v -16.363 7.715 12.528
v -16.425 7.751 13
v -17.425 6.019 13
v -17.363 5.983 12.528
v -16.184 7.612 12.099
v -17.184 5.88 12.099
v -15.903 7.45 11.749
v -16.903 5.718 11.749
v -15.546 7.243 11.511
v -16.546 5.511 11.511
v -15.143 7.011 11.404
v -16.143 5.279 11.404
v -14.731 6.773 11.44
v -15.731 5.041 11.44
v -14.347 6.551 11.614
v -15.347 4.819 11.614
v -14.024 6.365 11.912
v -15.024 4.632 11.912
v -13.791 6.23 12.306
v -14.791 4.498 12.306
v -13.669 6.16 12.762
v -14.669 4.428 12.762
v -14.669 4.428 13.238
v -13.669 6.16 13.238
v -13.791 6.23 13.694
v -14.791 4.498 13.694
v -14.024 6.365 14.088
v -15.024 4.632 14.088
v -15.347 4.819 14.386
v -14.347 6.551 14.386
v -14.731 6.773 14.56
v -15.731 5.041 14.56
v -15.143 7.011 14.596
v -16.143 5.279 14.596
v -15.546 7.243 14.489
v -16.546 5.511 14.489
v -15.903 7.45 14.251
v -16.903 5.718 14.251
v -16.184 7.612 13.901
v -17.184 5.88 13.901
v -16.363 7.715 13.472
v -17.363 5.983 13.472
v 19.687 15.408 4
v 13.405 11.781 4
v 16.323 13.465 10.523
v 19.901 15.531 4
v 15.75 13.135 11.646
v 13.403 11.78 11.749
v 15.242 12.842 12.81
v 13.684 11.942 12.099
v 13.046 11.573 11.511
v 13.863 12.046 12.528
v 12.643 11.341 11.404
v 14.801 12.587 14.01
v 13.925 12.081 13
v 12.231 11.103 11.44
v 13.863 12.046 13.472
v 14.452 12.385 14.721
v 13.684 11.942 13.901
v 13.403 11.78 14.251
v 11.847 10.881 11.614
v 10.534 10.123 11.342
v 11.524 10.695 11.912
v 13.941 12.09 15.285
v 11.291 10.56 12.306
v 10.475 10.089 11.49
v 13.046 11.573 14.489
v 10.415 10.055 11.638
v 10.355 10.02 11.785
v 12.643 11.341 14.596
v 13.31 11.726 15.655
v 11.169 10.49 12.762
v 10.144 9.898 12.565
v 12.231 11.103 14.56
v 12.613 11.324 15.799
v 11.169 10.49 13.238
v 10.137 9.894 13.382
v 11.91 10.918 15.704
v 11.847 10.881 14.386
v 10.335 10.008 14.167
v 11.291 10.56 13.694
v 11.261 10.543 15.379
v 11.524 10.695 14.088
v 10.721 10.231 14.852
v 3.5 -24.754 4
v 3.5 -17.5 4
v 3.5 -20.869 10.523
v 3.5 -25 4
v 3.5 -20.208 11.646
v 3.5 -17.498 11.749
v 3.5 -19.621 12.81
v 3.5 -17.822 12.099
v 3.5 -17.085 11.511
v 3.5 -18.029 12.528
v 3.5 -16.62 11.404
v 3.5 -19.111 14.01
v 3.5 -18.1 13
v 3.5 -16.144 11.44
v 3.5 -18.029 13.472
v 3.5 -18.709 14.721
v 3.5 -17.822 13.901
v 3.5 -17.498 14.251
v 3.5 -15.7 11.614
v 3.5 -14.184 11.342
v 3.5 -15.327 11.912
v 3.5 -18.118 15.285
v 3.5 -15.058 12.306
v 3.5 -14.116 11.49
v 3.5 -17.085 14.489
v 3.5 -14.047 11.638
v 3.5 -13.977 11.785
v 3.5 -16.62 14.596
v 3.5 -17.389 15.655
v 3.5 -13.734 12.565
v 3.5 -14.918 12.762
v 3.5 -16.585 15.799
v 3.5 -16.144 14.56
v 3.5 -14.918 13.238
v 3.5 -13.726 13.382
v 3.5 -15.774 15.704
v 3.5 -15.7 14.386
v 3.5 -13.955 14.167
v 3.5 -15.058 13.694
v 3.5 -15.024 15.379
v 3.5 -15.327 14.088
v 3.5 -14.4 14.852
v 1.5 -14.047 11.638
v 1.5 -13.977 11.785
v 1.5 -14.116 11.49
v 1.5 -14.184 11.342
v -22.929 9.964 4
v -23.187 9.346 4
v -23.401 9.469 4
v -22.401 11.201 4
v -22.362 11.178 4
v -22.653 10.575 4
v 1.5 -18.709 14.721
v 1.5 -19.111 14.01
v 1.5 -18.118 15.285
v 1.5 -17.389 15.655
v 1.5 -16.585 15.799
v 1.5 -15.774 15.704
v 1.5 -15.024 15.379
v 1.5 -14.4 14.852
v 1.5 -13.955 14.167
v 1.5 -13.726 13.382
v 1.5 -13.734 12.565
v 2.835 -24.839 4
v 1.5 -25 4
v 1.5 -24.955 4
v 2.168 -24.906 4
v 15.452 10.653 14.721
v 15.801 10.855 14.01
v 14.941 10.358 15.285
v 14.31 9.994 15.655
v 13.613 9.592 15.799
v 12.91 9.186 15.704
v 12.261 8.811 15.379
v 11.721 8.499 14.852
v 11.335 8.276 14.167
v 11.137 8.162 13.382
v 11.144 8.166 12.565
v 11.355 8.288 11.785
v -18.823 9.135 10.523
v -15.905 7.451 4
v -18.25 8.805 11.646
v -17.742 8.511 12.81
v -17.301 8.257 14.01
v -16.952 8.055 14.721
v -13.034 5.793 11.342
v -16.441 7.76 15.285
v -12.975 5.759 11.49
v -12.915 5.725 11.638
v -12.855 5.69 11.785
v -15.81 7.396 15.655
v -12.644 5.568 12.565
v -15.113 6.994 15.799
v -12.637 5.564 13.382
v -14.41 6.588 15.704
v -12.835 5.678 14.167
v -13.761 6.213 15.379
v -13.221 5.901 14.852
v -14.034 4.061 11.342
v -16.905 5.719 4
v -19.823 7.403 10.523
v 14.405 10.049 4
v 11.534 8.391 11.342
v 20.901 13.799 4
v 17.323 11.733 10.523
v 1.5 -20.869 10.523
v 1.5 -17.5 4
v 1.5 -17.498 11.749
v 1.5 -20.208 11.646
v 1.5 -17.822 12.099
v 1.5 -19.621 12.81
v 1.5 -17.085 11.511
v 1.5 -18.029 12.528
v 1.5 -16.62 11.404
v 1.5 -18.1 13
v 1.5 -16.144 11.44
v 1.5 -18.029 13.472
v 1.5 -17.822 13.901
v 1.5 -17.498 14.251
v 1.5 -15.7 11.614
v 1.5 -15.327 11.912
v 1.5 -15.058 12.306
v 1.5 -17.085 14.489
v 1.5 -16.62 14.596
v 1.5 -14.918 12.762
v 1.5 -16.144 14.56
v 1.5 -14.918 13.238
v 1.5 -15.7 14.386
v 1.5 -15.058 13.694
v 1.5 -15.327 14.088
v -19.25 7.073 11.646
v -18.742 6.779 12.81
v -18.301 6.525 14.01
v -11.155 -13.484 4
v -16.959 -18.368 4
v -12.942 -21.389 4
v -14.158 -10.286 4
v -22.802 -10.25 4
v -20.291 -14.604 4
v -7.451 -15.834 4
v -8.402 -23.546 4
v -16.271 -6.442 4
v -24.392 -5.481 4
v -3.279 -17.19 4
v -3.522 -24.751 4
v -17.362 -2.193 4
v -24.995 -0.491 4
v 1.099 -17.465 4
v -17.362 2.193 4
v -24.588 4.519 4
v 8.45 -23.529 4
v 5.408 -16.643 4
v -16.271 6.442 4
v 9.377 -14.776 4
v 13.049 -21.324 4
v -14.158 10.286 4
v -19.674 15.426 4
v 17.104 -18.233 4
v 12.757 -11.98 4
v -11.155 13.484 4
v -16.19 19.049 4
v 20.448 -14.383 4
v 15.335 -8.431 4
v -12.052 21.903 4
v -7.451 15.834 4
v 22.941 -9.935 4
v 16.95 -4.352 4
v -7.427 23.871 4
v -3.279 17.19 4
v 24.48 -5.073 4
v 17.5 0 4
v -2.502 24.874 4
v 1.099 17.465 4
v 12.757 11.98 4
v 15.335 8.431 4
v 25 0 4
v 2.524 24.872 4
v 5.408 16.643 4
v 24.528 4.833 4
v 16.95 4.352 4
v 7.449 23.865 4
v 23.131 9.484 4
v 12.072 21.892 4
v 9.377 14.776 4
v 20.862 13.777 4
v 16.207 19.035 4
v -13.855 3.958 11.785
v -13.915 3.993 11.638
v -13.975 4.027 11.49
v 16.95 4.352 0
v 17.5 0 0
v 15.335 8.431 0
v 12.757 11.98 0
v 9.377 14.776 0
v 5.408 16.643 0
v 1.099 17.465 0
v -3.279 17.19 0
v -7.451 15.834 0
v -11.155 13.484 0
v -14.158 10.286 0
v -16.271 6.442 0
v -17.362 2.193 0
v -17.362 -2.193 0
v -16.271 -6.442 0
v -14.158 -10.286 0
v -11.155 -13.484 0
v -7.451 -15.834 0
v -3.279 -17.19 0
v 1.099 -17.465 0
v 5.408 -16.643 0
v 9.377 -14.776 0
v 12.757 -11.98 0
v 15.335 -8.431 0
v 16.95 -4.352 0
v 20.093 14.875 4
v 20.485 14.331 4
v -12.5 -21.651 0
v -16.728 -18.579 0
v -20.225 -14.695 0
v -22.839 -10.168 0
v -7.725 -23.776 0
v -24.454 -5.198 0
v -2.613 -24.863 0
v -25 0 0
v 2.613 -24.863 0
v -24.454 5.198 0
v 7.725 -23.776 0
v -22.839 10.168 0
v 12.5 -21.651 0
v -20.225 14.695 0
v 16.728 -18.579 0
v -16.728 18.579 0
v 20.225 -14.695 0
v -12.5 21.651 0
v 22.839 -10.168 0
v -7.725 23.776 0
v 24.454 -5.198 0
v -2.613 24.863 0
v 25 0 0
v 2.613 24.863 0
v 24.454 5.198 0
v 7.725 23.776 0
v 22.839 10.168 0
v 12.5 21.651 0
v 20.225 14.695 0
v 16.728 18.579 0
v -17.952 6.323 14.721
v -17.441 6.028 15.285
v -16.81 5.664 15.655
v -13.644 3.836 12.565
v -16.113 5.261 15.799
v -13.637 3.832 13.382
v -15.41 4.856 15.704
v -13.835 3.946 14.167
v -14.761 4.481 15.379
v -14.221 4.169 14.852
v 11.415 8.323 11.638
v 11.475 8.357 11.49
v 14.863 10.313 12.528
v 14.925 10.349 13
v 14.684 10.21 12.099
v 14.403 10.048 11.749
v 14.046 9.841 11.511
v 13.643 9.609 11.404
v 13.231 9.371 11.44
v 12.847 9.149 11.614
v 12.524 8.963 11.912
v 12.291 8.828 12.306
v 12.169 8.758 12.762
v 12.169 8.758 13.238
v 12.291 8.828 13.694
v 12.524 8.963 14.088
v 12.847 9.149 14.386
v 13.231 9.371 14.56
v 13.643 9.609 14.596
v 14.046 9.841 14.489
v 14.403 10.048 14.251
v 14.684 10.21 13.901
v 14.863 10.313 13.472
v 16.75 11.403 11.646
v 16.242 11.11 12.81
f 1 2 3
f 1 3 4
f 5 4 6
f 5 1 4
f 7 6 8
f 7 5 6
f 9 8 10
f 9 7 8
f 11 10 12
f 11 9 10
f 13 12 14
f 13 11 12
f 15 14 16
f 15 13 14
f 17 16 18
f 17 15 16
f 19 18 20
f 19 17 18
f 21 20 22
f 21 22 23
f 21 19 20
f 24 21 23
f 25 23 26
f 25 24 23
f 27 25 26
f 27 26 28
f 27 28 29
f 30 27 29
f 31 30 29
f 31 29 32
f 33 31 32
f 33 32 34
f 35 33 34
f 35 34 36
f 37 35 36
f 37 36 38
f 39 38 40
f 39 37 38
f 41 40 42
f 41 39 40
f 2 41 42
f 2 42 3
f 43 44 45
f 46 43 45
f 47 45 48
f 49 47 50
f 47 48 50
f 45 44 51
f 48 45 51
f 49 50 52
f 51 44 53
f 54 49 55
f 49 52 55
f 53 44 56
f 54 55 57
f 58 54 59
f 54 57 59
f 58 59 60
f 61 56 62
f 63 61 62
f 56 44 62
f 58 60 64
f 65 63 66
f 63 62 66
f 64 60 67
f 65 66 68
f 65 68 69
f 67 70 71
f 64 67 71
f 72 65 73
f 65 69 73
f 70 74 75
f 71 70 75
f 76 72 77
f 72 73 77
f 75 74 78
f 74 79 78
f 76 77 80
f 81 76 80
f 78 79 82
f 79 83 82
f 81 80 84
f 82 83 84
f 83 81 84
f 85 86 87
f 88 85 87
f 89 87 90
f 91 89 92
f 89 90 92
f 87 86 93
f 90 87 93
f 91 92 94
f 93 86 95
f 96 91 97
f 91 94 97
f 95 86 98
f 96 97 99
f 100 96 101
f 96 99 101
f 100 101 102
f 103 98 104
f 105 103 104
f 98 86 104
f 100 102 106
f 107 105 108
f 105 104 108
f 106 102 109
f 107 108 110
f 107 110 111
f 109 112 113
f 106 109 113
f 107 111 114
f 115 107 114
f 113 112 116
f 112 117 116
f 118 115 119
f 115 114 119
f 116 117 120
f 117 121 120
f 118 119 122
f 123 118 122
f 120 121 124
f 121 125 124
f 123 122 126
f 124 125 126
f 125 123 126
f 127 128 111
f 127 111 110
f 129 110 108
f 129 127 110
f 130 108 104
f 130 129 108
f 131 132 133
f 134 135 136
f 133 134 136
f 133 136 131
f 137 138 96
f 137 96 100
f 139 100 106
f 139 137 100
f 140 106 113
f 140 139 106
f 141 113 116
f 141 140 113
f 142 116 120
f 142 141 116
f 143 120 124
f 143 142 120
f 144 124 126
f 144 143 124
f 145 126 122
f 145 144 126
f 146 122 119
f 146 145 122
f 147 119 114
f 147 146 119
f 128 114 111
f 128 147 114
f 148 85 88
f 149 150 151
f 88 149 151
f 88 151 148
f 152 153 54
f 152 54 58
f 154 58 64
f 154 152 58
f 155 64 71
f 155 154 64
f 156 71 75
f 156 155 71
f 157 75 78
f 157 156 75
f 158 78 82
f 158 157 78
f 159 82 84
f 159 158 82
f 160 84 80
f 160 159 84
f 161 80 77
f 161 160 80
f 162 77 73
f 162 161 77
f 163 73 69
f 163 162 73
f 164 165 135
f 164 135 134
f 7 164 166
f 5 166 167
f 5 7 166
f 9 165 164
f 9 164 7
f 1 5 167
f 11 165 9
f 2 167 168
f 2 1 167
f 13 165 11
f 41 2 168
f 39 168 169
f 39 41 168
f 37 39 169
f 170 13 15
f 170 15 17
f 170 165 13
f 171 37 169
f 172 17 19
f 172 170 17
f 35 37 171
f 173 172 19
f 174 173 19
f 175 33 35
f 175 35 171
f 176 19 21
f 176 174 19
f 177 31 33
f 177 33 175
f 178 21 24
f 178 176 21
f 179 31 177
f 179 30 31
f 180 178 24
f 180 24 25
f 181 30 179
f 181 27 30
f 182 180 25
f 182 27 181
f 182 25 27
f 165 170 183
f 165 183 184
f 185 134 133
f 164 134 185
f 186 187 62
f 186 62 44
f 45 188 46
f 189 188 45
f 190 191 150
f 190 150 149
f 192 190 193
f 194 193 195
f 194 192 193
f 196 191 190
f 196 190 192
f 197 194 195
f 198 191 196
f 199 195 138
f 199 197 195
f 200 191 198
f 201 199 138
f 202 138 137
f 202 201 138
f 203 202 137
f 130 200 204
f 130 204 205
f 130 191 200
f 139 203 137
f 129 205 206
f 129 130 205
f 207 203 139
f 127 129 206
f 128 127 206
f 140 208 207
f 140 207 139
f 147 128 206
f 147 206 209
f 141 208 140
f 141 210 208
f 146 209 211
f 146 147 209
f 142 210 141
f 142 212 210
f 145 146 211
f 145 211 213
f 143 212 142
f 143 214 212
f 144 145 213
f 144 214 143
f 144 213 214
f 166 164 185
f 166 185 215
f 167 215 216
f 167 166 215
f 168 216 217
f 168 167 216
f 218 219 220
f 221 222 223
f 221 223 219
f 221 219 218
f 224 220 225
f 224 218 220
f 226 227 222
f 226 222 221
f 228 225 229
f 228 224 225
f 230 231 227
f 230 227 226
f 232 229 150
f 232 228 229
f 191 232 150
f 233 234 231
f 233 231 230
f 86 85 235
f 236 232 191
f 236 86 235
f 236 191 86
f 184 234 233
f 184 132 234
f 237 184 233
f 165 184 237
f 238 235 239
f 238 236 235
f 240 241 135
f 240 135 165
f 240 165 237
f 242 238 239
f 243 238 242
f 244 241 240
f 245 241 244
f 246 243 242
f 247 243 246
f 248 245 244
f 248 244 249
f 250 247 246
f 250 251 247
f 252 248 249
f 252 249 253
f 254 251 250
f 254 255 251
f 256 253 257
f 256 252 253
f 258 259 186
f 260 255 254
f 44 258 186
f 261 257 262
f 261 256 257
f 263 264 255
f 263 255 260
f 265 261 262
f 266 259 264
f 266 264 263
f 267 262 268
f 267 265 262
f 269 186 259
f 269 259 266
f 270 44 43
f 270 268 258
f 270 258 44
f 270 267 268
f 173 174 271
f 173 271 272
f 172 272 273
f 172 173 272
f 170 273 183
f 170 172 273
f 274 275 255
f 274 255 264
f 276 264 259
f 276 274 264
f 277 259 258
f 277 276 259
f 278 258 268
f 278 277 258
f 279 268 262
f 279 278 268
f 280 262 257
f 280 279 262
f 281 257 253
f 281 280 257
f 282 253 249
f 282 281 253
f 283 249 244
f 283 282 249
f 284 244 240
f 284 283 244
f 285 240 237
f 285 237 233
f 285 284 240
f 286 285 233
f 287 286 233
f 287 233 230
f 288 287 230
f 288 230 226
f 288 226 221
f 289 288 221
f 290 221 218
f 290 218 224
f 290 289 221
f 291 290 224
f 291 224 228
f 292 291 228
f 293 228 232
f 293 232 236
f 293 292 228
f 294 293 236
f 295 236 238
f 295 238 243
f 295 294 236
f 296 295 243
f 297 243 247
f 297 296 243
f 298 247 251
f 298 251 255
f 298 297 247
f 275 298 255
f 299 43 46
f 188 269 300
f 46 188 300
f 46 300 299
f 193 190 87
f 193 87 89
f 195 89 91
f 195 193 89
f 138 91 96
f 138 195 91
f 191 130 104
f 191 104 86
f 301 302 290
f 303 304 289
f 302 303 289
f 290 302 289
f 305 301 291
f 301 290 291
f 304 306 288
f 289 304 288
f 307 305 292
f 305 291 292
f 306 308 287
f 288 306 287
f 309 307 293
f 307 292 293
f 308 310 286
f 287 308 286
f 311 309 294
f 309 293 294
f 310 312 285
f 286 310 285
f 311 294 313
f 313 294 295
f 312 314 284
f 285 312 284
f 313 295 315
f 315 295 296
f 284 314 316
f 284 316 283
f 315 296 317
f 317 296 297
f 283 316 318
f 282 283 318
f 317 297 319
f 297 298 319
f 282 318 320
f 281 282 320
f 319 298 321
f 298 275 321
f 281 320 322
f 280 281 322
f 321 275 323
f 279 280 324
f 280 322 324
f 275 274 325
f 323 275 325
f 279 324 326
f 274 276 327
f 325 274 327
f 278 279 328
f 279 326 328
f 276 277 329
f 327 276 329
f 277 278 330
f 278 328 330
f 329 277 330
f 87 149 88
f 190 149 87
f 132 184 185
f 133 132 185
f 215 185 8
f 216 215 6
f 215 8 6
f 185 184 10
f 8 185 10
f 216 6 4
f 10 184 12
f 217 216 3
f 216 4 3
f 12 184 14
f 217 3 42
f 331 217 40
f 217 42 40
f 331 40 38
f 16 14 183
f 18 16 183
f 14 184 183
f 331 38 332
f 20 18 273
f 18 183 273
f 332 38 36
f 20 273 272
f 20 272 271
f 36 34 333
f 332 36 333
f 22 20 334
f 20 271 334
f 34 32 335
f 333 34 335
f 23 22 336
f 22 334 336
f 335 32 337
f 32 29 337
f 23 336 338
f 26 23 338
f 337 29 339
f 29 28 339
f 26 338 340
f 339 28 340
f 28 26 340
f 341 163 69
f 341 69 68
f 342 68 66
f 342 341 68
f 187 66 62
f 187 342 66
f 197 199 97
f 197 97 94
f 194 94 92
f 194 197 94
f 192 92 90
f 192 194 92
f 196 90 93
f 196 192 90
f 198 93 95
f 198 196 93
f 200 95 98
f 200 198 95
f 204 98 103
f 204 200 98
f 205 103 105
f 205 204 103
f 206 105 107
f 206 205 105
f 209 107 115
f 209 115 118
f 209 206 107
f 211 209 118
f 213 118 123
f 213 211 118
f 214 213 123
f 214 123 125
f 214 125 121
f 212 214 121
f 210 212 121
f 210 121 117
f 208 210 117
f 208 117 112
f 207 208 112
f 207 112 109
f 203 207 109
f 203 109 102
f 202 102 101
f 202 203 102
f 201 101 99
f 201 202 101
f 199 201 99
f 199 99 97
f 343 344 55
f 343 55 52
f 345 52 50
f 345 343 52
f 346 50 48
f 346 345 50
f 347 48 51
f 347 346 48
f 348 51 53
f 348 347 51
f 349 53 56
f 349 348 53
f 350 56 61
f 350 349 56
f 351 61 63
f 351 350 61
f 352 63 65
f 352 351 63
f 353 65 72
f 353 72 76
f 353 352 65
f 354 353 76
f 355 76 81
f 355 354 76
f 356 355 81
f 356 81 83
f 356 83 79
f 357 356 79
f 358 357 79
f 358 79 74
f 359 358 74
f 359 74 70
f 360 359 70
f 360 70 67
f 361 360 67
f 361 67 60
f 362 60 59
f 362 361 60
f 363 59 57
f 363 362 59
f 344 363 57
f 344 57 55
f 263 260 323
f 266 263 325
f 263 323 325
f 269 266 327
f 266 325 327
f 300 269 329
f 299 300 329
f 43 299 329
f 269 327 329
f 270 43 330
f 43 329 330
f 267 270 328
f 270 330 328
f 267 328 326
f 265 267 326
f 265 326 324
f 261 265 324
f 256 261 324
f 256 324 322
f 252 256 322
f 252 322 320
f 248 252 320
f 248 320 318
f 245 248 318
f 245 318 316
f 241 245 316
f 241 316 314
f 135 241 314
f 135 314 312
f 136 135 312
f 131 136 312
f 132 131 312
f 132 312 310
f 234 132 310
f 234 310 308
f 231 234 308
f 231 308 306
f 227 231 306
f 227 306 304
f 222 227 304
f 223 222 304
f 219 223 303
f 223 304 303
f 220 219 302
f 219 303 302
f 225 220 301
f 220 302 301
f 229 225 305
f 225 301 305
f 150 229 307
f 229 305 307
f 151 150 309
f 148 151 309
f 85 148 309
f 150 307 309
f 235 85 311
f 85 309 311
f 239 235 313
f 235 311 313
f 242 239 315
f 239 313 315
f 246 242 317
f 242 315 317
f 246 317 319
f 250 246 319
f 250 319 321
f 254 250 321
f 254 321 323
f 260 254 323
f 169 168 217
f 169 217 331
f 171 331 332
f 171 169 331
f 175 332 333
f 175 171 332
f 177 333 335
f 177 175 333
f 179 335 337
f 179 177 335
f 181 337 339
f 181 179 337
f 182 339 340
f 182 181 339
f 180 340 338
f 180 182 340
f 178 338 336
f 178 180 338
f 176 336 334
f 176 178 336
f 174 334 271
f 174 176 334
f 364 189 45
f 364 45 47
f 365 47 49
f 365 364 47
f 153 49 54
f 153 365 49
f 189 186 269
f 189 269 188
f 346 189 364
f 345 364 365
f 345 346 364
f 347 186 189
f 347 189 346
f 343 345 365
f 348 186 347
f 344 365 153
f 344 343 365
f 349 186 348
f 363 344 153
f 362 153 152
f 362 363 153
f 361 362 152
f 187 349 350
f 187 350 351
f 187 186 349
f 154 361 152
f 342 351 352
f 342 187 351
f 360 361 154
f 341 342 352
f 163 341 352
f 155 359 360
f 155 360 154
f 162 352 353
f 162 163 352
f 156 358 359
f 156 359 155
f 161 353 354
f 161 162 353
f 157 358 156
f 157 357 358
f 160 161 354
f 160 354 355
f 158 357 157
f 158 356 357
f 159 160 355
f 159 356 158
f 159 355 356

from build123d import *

# Parameters (mm, degrees)
SCHIZZO2_R                   = 25
SCHIZZO2_R_2                 = 17.5
ESTRUSIONE_ESTRUSIONE1_DEPTH = 4
SCHIZZO3_R                   = 1.6
ESTRUSIONE_ESTRUSIONE2_DEPTH = 2
RIPETIZIONECIRCOLARE1_COUNT  = 3


with BuildPart() as part:
    # Schizzo2 → Estrusione-Estrusione1 (new body)
    with BuildSketch(Plane.XY):
        Circle(SCHIZZO2_R)
        Circle(SCHIZZO2_R_2, mode=Mode.SUBTRACT)
    extrude(amount=ESTRUSIONE_ESTRUSIONE1_DEPTH)

    # Schizzo3 → Estrusione-Estrusione2 (add)
    with BuildSketch(Plane(origin=(-0.75, 1.299038106, 0), x_dir=(0, 0, -1), z_dir=(-0.5000000000000043, 0.866025403784436, 0))):
        with BuildLine():
            Line((-11.341531907, -14.184207936), (-4, -17.5))
            Line((-4, -17.5), (-4, -25))
            Line((-4, -25), (-10.523132314, -20.868682868))
            ThreePointArc((-10.523132314, -20.868682868), (-12.223574858, -19.90479517), (-14.009986273, -19.111499134))
            ThreePointArc((-14.009986273, -19.111499134), (-15.569198234, -15.386797217), (-11.785347493, -13.977180291))
            ThreePointArc((-11.785347493, -13.977180291), (-11.564073393, -14.082052593), (-11.341531907, -14.184207936))
        make_face()
        with Locations((-13, -16.5)):
            Circle(SCHIZZO3_R, mode=Mode.SUBTRACT)
    estrusione_estrusione2 = extrude(amount=ESTRUSIONE_ESTRUSIONE2_DEPTH)

    # RipetizioneCircolare1: Estrusione-Estrusione2 ×3 about axis
    ripetizionecircolare1_axis = Axis((0, 0, -0.2), (0, 0, 1))
    for i in range(1, RIPETIZIONECIRCOLARE1_COUNT):
        add(estrusione_estrusione2.rotate(ripetizionecircolare1_axis, i * 360 / RIPETIZIONECIRCOLARE1_COUNT))


solid = part.part
